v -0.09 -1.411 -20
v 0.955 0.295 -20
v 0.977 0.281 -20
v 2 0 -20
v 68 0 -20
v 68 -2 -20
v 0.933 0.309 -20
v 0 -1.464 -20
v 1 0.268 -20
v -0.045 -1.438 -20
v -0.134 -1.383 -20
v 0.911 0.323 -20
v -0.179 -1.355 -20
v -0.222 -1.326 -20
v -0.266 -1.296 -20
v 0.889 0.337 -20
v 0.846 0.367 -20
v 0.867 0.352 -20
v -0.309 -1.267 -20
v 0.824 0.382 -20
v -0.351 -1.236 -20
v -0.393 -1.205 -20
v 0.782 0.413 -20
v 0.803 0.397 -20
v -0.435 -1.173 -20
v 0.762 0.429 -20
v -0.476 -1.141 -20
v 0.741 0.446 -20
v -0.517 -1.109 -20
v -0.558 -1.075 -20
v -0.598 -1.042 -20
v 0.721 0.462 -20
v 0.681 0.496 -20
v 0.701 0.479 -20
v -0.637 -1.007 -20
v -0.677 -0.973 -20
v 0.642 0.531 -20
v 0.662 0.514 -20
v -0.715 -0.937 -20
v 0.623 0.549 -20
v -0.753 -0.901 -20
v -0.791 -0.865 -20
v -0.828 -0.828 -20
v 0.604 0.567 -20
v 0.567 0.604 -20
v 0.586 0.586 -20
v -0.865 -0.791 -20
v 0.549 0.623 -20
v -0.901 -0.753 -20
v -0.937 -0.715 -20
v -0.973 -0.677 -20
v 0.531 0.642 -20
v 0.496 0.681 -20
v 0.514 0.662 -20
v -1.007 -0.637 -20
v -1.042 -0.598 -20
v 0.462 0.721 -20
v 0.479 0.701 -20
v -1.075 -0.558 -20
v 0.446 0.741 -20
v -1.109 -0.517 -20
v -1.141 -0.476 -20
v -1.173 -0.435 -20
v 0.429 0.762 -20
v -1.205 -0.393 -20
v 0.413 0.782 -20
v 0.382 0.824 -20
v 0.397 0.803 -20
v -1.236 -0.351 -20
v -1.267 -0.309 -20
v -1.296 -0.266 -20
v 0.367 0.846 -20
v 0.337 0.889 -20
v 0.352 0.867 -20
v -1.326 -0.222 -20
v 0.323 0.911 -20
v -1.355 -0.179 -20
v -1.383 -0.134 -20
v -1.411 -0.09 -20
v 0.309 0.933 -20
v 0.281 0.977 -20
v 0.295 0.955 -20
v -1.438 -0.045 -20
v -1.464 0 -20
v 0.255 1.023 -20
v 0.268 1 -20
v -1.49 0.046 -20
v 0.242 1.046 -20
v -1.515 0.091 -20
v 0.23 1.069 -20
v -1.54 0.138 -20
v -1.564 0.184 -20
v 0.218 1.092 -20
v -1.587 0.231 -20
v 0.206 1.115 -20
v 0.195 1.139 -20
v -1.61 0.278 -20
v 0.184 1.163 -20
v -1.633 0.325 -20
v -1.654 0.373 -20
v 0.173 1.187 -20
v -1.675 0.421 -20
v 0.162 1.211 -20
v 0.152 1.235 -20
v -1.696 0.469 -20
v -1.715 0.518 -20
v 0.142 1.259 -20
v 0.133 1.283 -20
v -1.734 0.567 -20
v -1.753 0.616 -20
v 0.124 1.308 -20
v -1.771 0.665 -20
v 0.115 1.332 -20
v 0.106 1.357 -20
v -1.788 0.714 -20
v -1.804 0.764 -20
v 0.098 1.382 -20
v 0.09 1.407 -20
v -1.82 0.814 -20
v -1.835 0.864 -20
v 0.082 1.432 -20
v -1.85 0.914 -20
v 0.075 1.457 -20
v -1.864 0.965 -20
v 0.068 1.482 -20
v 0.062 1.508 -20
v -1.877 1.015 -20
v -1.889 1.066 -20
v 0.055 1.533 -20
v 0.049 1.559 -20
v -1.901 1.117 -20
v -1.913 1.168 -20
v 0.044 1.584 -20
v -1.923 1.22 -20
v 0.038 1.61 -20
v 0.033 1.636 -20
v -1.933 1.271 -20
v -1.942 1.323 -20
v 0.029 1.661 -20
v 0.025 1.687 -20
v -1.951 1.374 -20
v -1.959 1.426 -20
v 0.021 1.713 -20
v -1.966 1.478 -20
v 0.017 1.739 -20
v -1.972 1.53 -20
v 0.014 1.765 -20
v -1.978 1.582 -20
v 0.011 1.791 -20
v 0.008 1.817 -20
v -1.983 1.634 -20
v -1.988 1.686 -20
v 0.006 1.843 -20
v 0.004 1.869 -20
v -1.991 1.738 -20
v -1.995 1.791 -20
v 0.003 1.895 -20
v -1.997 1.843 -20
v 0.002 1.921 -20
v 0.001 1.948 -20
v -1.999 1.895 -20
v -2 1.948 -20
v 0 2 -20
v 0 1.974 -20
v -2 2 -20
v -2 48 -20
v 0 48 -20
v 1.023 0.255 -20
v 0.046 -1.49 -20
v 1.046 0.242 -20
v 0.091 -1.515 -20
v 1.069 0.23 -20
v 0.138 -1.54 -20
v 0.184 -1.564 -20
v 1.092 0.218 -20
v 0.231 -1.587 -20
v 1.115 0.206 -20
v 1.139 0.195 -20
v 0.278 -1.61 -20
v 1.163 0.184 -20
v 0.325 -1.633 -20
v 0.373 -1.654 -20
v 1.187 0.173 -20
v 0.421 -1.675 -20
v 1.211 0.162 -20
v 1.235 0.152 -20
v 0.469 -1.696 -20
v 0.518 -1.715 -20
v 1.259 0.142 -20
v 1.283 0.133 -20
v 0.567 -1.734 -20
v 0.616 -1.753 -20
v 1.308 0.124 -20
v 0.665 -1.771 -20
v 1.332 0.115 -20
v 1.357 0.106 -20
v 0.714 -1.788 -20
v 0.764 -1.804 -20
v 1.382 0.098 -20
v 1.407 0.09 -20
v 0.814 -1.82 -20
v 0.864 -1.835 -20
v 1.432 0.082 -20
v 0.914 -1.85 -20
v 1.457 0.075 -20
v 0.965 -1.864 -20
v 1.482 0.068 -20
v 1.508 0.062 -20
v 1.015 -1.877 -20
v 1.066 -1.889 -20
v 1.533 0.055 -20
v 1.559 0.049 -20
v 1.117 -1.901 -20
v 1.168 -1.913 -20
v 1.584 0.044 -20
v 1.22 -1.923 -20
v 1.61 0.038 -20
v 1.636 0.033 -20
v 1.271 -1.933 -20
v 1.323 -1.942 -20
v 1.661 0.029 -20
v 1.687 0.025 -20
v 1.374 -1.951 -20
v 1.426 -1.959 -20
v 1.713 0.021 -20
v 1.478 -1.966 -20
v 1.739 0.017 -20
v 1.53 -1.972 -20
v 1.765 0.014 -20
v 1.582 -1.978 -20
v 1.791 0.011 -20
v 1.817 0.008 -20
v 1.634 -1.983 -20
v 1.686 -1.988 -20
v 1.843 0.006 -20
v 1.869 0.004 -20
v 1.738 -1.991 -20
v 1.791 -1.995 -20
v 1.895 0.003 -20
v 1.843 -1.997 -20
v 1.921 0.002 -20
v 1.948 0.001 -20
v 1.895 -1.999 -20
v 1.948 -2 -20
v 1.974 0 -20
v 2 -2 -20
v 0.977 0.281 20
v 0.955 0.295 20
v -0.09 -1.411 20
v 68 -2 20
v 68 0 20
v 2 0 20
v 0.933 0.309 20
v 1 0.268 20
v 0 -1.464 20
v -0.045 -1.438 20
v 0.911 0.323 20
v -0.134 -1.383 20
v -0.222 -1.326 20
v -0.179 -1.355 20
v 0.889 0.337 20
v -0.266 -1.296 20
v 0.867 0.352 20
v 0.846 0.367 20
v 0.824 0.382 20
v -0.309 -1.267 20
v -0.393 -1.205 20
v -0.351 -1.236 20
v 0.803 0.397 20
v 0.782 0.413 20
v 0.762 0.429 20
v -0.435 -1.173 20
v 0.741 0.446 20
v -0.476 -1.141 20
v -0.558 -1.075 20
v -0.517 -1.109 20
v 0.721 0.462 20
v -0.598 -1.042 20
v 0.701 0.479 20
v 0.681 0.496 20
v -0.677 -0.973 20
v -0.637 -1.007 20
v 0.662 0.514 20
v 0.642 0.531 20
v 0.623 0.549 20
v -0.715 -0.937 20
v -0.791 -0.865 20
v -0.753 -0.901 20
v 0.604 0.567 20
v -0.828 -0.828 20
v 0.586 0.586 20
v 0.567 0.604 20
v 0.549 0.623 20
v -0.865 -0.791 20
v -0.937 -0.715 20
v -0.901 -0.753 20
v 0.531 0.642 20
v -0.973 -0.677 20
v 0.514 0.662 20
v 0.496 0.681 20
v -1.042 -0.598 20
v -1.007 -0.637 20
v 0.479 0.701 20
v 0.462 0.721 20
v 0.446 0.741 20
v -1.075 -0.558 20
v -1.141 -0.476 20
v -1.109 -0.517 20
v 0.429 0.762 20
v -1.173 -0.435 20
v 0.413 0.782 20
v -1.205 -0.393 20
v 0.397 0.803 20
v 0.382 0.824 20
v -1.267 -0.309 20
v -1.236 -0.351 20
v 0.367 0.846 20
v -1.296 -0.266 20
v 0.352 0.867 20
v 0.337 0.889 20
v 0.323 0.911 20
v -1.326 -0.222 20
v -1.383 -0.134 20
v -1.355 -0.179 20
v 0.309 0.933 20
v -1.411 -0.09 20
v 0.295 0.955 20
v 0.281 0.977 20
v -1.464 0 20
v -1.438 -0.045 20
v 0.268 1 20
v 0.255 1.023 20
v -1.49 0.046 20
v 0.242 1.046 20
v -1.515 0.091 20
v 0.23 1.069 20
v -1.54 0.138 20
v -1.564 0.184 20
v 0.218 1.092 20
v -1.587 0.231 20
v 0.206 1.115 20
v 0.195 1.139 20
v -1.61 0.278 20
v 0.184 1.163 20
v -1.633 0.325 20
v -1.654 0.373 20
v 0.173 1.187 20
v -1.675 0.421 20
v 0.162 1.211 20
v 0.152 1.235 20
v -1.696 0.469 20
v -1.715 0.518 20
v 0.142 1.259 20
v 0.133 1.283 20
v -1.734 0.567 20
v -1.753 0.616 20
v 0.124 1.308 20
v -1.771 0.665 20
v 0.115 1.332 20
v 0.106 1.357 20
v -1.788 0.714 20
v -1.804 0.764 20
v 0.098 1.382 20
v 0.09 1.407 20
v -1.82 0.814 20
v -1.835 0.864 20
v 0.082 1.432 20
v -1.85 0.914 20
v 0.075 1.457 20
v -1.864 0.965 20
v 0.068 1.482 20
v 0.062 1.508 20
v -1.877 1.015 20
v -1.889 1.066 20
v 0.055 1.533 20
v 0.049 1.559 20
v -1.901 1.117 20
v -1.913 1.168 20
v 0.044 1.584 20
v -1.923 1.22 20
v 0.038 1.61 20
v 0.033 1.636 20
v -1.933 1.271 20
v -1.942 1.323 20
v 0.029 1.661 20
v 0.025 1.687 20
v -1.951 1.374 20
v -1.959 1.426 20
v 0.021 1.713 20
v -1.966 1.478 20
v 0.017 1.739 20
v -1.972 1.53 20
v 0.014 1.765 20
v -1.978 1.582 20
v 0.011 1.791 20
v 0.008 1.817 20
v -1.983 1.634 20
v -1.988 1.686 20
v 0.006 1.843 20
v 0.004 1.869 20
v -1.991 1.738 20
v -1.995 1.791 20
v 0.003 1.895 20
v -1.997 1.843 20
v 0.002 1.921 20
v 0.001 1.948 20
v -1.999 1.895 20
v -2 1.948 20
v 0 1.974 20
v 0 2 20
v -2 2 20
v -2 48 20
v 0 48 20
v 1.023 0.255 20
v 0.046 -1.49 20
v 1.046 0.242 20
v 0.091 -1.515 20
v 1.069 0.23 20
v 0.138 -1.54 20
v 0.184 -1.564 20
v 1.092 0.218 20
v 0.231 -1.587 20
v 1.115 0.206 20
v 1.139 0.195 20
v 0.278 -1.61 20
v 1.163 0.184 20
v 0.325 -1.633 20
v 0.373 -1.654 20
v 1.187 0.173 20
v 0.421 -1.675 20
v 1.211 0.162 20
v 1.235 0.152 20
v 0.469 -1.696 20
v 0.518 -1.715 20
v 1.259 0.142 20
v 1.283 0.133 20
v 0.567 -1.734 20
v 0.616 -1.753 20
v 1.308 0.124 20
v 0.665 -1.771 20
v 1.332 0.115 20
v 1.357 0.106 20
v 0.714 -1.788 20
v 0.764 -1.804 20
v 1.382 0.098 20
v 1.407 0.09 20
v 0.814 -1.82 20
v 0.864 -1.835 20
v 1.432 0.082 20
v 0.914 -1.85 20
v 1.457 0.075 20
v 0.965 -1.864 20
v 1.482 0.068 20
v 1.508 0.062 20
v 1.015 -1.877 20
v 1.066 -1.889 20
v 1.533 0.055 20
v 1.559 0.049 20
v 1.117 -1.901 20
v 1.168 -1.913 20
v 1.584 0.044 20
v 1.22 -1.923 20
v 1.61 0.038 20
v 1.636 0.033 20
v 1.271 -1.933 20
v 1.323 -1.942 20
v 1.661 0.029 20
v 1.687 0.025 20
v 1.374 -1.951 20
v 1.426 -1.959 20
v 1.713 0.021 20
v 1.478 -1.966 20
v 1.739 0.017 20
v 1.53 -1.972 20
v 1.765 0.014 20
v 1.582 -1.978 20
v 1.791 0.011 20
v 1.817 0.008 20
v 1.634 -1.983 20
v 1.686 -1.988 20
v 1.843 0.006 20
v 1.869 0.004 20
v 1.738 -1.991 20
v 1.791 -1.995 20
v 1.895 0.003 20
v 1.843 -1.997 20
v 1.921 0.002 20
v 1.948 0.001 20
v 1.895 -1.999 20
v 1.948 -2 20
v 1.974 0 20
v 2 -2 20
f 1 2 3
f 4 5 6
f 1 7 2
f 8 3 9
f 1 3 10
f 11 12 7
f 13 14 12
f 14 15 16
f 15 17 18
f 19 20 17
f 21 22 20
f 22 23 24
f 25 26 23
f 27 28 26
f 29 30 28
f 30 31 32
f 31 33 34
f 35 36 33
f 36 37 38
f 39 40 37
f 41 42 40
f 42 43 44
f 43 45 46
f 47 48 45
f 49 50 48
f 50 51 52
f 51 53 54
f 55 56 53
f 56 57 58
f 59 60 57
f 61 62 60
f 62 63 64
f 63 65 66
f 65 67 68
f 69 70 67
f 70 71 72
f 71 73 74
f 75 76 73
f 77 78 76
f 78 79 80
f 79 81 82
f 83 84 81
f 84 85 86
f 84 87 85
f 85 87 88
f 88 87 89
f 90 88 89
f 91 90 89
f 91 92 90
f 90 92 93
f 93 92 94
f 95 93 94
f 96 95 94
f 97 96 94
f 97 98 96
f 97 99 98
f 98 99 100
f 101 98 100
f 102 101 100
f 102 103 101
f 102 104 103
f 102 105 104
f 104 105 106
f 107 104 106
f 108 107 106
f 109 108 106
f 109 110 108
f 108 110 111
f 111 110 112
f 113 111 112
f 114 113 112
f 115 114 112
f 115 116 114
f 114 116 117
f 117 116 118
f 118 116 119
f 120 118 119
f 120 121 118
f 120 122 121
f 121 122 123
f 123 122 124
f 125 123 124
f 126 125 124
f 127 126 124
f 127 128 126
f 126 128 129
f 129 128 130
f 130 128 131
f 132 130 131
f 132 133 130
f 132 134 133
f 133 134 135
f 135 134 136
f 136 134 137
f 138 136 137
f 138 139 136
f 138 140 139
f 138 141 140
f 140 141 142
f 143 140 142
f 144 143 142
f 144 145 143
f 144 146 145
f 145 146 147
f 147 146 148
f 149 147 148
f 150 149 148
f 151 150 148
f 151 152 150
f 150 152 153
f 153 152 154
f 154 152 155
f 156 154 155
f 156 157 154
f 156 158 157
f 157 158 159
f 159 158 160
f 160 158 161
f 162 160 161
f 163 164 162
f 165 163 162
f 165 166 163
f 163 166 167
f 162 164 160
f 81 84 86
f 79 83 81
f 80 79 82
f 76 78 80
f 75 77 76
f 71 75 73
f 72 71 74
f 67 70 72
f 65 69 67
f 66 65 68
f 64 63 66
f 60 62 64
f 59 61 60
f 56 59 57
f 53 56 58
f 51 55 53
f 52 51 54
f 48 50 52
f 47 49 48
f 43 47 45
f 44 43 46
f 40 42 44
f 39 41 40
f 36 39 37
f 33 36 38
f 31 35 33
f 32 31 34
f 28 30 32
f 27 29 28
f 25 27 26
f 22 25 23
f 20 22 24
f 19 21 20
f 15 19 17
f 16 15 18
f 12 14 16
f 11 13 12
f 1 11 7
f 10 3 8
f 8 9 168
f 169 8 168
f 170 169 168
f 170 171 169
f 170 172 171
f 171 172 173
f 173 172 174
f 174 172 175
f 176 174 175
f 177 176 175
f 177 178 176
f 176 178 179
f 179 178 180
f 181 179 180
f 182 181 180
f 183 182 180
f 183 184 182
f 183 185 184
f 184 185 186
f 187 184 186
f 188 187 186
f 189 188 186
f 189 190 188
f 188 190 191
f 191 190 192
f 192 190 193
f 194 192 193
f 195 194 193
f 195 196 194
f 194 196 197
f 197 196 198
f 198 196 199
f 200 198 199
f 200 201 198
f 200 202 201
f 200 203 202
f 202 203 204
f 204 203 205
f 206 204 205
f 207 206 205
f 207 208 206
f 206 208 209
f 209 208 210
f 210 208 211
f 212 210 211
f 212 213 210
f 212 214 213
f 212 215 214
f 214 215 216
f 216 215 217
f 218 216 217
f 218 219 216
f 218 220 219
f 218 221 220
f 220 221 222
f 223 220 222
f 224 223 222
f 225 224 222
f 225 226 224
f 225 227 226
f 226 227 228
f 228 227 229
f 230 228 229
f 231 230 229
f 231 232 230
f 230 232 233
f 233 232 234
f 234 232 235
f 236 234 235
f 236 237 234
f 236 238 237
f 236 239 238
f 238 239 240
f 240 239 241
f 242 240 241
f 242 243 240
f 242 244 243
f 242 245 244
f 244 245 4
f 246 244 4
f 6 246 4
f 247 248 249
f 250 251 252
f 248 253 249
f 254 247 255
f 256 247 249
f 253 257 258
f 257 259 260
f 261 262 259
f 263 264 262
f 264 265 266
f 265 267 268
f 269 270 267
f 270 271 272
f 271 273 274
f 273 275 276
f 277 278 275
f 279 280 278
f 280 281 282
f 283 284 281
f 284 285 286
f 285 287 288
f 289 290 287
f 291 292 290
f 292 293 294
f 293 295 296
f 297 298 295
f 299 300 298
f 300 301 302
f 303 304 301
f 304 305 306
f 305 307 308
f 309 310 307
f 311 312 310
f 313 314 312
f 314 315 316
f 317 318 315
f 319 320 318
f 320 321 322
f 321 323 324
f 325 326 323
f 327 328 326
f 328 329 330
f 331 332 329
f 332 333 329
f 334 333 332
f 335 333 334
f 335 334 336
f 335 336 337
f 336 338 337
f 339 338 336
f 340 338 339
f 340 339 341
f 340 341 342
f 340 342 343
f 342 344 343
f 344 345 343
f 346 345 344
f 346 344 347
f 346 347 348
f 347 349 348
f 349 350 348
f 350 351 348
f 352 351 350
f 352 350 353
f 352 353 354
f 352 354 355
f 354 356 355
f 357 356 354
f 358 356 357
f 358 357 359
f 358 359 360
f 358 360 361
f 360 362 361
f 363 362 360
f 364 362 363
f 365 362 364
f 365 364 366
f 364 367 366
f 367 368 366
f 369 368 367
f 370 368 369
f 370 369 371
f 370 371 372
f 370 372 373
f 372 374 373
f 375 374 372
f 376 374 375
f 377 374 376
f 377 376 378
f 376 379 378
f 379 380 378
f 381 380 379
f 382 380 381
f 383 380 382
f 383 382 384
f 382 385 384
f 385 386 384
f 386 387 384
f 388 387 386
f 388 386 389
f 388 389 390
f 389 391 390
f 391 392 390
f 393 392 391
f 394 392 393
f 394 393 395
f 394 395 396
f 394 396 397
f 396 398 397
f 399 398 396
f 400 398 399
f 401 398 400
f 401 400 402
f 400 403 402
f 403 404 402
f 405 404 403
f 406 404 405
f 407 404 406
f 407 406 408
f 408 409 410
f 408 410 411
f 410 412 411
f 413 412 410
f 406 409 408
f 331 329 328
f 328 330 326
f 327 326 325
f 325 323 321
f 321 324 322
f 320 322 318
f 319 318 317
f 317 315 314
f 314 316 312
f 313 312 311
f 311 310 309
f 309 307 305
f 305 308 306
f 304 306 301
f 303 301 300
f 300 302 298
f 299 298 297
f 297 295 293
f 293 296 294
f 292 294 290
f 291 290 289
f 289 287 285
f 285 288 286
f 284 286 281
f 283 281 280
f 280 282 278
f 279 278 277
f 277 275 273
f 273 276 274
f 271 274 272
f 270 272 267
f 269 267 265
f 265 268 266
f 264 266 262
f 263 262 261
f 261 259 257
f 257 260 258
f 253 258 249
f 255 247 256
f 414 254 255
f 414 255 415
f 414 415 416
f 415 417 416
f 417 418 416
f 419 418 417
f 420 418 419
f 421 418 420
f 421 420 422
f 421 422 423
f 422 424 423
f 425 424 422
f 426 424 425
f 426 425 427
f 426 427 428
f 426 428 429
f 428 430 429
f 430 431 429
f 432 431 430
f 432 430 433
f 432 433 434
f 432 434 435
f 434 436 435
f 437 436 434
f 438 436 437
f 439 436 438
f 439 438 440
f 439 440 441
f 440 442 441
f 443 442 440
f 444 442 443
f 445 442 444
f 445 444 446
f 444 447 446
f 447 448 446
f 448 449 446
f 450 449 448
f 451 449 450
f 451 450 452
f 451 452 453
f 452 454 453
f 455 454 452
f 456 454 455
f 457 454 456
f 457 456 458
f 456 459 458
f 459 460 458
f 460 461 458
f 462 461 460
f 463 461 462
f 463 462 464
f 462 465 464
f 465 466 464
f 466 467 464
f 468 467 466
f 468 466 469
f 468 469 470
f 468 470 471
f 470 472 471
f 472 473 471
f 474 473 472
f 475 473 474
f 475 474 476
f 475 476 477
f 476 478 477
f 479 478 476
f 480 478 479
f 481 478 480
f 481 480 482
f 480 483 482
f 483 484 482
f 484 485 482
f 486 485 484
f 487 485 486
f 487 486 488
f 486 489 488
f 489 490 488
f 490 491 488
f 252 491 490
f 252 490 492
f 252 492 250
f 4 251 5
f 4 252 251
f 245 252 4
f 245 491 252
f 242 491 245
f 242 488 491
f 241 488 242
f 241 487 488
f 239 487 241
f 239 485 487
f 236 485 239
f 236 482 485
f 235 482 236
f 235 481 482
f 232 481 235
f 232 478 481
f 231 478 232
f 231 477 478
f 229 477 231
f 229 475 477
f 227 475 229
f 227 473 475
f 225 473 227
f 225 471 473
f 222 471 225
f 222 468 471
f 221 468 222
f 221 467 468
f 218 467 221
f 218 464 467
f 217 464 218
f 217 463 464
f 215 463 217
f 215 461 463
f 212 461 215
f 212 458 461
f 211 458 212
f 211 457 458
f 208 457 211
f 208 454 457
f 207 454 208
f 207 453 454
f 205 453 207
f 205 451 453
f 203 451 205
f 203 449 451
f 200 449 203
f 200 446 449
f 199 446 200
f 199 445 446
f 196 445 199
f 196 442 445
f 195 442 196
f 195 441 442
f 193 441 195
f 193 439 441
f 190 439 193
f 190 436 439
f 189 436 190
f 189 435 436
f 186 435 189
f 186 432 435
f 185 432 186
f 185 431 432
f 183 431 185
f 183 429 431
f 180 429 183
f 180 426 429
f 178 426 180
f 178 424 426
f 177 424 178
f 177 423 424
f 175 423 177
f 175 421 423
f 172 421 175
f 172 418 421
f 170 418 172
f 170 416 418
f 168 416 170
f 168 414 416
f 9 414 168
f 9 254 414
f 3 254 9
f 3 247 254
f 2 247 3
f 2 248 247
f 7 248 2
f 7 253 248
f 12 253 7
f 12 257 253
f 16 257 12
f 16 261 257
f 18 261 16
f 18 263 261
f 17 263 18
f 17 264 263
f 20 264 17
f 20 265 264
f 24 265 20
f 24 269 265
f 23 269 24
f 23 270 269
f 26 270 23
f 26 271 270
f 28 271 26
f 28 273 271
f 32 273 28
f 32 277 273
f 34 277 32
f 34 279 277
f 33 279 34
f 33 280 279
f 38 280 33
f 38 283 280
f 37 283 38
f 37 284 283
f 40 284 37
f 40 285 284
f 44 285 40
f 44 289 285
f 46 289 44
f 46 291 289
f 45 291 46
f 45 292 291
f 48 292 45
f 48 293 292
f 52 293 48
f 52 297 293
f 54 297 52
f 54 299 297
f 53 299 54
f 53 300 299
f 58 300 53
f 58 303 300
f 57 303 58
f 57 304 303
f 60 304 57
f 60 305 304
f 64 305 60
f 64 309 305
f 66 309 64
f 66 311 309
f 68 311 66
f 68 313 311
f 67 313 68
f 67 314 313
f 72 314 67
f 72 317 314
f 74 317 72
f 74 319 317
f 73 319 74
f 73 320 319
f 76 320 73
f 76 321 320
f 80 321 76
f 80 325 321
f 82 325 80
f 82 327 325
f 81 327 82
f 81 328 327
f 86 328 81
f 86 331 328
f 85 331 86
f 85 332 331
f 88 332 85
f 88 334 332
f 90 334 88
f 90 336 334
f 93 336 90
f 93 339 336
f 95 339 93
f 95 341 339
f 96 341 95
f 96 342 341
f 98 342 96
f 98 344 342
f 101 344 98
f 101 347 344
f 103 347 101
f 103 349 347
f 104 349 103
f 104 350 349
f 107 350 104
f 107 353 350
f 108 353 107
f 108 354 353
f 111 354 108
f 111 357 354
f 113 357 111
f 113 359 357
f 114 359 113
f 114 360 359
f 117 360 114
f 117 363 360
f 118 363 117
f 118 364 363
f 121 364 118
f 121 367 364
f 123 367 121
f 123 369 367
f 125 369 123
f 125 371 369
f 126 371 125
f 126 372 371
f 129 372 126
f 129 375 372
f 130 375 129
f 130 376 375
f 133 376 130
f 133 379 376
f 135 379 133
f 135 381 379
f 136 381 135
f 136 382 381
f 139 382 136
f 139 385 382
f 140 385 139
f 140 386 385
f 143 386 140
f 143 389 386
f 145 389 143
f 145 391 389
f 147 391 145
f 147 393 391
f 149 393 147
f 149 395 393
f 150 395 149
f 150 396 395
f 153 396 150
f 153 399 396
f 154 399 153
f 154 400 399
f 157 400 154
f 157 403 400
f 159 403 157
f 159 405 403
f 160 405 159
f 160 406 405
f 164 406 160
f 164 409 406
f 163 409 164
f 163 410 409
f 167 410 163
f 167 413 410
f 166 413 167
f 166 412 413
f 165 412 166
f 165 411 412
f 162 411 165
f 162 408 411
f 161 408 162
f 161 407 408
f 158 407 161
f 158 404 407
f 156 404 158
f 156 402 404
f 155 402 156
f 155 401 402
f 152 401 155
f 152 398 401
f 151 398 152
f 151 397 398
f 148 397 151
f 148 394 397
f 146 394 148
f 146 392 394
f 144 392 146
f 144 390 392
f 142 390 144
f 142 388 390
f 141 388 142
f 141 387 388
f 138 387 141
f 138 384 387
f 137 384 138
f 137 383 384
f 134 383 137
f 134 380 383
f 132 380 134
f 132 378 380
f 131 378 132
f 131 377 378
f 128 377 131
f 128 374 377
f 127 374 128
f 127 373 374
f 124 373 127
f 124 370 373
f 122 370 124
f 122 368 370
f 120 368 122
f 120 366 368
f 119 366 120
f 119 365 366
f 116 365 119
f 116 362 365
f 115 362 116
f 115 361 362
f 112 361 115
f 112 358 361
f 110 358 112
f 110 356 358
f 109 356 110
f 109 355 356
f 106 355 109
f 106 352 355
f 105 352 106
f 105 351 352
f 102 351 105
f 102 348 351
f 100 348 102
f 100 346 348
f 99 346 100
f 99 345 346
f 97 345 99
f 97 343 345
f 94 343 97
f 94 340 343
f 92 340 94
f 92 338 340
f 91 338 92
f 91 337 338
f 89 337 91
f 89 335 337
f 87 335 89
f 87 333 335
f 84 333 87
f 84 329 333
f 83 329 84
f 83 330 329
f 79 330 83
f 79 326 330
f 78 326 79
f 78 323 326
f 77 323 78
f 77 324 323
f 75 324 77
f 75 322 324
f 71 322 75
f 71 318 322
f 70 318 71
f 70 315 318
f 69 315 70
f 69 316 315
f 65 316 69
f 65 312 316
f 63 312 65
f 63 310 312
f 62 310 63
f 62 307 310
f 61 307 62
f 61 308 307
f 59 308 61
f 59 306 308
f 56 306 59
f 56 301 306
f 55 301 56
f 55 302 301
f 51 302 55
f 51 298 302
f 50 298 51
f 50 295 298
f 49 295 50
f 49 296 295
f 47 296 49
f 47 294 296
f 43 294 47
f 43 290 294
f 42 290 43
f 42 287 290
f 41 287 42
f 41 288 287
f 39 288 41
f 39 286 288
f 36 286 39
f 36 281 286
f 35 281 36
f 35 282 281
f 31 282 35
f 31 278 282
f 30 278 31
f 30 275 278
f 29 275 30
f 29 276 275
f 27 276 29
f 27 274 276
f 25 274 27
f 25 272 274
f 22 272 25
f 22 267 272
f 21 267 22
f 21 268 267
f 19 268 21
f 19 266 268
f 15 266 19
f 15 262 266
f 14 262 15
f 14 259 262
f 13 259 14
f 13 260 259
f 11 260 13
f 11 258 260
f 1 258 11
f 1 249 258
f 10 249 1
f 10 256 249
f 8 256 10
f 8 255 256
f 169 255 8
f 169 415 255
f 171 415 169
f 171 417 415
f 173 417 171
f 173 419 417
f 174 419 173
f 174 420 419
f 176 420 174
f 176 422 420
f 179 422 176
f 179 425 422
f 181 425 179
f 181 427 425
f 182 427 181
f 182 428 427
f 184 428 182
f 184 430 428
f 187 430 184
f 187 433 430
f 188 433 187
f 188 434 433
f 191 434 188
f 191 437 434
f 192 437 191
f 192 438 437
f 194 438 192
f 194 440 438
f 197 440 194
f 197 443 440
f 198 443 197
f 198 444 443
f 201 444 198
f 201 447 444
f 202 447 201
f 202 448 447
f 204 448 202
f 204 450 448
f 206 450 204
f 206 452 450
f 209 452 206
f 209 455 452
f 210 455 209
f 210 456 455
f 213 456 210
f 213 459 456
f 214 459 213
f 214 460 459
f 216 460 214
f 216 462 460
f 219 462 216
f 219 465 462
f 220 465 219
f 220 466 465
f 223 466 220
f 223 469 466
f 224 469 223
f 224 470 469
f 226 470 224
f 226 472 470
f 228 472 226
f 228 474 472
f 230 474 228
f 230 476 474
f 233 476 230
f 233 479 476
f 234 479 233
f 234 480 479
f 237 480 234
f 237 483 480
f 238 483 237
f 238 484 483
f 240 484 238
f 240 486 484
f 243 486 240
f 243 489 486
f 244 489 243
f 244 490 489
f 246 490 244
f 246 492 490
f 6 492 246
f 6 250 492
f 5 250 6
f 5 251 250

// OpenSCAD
// OpenSCAD model of a constant-thickness sheet-metal L-bracket
// Designed for manufacturing verification with bend allowance.

// Parameters
thickness = 2.0;          // Sheet metal thickness (mm)
inside_radius = 2.0;      // Inside bend radius (mm)
flange1_outside = 70.0;   // Outside length of flange 1 (mm)
flange2_outside = 50.0;   // Outside length of flange 2 (mm)
width = 40.0;             // Bracket width (mm)
k_factor = 0.45;          // K-factor for bend allowance calculation

// Derived manufacturing dimensions
outside_radius = inside_radius + thickness;
leg1_flat = flange1_outside - outside_radius;
leg2_flat = flange2_outside - outside_radius;
bend_angle = 90.0;
bend_allowance = (bend_angle * 3.141592653589793 / 180.0) * (inside_radius + k_factor * thickness);
flat_length = leg1_flat + leg2_flat + bend_allowance;

// Echo manifest line for validation/ERP integration
echo(str("MAKERBENCH-SHEETMETAL: {\"thickness_mm\": ", thickness, ", \"bend_radius_mm\": ", inside_radius, ", \"flat_length_mm\": ", flat_length, "}"));

// 3D Solid Geometry Generation
$fn = 120; // Arc resolution for smooth curves

// Coordinates layout:
// Center of the bend arc is positioned at (inside_radius, inside_radius)
cx = inside_radius;
cy = inside_radius;

// Generate 2D profile points
outer_bend = [for (i = [0 : $fn]) 
    let (a = 270 - 90 * i / $fn) 
    [cx + (inside_radius + thickness) * cos(a), cy + (inside_radius + thickness) * sin(a)]
];

inner_bend = [for (i = [0 : $fn]) 
    let (a = 180 + 90 * i / $fn) 
    [cx + inside_radius * cos(a), cy + inside_radius * sin(a)]
];

// Combine all profile coordinates in counter-clockwise order
profile_points = concat(
    [[flange1_outside - thickness, -thickness]],
    outer_bend,
    [[-thickness, flange2_outside - thickness], [0, flange2_outside - thickness]],
    inner_bend,
    [[flange1_outside - thickness, 0]]
);

// Extrude 2D profile to create the final 3D L-bracket solid
linear_extrude(height = width, center = true) {
    polygon(profile_points);
}
